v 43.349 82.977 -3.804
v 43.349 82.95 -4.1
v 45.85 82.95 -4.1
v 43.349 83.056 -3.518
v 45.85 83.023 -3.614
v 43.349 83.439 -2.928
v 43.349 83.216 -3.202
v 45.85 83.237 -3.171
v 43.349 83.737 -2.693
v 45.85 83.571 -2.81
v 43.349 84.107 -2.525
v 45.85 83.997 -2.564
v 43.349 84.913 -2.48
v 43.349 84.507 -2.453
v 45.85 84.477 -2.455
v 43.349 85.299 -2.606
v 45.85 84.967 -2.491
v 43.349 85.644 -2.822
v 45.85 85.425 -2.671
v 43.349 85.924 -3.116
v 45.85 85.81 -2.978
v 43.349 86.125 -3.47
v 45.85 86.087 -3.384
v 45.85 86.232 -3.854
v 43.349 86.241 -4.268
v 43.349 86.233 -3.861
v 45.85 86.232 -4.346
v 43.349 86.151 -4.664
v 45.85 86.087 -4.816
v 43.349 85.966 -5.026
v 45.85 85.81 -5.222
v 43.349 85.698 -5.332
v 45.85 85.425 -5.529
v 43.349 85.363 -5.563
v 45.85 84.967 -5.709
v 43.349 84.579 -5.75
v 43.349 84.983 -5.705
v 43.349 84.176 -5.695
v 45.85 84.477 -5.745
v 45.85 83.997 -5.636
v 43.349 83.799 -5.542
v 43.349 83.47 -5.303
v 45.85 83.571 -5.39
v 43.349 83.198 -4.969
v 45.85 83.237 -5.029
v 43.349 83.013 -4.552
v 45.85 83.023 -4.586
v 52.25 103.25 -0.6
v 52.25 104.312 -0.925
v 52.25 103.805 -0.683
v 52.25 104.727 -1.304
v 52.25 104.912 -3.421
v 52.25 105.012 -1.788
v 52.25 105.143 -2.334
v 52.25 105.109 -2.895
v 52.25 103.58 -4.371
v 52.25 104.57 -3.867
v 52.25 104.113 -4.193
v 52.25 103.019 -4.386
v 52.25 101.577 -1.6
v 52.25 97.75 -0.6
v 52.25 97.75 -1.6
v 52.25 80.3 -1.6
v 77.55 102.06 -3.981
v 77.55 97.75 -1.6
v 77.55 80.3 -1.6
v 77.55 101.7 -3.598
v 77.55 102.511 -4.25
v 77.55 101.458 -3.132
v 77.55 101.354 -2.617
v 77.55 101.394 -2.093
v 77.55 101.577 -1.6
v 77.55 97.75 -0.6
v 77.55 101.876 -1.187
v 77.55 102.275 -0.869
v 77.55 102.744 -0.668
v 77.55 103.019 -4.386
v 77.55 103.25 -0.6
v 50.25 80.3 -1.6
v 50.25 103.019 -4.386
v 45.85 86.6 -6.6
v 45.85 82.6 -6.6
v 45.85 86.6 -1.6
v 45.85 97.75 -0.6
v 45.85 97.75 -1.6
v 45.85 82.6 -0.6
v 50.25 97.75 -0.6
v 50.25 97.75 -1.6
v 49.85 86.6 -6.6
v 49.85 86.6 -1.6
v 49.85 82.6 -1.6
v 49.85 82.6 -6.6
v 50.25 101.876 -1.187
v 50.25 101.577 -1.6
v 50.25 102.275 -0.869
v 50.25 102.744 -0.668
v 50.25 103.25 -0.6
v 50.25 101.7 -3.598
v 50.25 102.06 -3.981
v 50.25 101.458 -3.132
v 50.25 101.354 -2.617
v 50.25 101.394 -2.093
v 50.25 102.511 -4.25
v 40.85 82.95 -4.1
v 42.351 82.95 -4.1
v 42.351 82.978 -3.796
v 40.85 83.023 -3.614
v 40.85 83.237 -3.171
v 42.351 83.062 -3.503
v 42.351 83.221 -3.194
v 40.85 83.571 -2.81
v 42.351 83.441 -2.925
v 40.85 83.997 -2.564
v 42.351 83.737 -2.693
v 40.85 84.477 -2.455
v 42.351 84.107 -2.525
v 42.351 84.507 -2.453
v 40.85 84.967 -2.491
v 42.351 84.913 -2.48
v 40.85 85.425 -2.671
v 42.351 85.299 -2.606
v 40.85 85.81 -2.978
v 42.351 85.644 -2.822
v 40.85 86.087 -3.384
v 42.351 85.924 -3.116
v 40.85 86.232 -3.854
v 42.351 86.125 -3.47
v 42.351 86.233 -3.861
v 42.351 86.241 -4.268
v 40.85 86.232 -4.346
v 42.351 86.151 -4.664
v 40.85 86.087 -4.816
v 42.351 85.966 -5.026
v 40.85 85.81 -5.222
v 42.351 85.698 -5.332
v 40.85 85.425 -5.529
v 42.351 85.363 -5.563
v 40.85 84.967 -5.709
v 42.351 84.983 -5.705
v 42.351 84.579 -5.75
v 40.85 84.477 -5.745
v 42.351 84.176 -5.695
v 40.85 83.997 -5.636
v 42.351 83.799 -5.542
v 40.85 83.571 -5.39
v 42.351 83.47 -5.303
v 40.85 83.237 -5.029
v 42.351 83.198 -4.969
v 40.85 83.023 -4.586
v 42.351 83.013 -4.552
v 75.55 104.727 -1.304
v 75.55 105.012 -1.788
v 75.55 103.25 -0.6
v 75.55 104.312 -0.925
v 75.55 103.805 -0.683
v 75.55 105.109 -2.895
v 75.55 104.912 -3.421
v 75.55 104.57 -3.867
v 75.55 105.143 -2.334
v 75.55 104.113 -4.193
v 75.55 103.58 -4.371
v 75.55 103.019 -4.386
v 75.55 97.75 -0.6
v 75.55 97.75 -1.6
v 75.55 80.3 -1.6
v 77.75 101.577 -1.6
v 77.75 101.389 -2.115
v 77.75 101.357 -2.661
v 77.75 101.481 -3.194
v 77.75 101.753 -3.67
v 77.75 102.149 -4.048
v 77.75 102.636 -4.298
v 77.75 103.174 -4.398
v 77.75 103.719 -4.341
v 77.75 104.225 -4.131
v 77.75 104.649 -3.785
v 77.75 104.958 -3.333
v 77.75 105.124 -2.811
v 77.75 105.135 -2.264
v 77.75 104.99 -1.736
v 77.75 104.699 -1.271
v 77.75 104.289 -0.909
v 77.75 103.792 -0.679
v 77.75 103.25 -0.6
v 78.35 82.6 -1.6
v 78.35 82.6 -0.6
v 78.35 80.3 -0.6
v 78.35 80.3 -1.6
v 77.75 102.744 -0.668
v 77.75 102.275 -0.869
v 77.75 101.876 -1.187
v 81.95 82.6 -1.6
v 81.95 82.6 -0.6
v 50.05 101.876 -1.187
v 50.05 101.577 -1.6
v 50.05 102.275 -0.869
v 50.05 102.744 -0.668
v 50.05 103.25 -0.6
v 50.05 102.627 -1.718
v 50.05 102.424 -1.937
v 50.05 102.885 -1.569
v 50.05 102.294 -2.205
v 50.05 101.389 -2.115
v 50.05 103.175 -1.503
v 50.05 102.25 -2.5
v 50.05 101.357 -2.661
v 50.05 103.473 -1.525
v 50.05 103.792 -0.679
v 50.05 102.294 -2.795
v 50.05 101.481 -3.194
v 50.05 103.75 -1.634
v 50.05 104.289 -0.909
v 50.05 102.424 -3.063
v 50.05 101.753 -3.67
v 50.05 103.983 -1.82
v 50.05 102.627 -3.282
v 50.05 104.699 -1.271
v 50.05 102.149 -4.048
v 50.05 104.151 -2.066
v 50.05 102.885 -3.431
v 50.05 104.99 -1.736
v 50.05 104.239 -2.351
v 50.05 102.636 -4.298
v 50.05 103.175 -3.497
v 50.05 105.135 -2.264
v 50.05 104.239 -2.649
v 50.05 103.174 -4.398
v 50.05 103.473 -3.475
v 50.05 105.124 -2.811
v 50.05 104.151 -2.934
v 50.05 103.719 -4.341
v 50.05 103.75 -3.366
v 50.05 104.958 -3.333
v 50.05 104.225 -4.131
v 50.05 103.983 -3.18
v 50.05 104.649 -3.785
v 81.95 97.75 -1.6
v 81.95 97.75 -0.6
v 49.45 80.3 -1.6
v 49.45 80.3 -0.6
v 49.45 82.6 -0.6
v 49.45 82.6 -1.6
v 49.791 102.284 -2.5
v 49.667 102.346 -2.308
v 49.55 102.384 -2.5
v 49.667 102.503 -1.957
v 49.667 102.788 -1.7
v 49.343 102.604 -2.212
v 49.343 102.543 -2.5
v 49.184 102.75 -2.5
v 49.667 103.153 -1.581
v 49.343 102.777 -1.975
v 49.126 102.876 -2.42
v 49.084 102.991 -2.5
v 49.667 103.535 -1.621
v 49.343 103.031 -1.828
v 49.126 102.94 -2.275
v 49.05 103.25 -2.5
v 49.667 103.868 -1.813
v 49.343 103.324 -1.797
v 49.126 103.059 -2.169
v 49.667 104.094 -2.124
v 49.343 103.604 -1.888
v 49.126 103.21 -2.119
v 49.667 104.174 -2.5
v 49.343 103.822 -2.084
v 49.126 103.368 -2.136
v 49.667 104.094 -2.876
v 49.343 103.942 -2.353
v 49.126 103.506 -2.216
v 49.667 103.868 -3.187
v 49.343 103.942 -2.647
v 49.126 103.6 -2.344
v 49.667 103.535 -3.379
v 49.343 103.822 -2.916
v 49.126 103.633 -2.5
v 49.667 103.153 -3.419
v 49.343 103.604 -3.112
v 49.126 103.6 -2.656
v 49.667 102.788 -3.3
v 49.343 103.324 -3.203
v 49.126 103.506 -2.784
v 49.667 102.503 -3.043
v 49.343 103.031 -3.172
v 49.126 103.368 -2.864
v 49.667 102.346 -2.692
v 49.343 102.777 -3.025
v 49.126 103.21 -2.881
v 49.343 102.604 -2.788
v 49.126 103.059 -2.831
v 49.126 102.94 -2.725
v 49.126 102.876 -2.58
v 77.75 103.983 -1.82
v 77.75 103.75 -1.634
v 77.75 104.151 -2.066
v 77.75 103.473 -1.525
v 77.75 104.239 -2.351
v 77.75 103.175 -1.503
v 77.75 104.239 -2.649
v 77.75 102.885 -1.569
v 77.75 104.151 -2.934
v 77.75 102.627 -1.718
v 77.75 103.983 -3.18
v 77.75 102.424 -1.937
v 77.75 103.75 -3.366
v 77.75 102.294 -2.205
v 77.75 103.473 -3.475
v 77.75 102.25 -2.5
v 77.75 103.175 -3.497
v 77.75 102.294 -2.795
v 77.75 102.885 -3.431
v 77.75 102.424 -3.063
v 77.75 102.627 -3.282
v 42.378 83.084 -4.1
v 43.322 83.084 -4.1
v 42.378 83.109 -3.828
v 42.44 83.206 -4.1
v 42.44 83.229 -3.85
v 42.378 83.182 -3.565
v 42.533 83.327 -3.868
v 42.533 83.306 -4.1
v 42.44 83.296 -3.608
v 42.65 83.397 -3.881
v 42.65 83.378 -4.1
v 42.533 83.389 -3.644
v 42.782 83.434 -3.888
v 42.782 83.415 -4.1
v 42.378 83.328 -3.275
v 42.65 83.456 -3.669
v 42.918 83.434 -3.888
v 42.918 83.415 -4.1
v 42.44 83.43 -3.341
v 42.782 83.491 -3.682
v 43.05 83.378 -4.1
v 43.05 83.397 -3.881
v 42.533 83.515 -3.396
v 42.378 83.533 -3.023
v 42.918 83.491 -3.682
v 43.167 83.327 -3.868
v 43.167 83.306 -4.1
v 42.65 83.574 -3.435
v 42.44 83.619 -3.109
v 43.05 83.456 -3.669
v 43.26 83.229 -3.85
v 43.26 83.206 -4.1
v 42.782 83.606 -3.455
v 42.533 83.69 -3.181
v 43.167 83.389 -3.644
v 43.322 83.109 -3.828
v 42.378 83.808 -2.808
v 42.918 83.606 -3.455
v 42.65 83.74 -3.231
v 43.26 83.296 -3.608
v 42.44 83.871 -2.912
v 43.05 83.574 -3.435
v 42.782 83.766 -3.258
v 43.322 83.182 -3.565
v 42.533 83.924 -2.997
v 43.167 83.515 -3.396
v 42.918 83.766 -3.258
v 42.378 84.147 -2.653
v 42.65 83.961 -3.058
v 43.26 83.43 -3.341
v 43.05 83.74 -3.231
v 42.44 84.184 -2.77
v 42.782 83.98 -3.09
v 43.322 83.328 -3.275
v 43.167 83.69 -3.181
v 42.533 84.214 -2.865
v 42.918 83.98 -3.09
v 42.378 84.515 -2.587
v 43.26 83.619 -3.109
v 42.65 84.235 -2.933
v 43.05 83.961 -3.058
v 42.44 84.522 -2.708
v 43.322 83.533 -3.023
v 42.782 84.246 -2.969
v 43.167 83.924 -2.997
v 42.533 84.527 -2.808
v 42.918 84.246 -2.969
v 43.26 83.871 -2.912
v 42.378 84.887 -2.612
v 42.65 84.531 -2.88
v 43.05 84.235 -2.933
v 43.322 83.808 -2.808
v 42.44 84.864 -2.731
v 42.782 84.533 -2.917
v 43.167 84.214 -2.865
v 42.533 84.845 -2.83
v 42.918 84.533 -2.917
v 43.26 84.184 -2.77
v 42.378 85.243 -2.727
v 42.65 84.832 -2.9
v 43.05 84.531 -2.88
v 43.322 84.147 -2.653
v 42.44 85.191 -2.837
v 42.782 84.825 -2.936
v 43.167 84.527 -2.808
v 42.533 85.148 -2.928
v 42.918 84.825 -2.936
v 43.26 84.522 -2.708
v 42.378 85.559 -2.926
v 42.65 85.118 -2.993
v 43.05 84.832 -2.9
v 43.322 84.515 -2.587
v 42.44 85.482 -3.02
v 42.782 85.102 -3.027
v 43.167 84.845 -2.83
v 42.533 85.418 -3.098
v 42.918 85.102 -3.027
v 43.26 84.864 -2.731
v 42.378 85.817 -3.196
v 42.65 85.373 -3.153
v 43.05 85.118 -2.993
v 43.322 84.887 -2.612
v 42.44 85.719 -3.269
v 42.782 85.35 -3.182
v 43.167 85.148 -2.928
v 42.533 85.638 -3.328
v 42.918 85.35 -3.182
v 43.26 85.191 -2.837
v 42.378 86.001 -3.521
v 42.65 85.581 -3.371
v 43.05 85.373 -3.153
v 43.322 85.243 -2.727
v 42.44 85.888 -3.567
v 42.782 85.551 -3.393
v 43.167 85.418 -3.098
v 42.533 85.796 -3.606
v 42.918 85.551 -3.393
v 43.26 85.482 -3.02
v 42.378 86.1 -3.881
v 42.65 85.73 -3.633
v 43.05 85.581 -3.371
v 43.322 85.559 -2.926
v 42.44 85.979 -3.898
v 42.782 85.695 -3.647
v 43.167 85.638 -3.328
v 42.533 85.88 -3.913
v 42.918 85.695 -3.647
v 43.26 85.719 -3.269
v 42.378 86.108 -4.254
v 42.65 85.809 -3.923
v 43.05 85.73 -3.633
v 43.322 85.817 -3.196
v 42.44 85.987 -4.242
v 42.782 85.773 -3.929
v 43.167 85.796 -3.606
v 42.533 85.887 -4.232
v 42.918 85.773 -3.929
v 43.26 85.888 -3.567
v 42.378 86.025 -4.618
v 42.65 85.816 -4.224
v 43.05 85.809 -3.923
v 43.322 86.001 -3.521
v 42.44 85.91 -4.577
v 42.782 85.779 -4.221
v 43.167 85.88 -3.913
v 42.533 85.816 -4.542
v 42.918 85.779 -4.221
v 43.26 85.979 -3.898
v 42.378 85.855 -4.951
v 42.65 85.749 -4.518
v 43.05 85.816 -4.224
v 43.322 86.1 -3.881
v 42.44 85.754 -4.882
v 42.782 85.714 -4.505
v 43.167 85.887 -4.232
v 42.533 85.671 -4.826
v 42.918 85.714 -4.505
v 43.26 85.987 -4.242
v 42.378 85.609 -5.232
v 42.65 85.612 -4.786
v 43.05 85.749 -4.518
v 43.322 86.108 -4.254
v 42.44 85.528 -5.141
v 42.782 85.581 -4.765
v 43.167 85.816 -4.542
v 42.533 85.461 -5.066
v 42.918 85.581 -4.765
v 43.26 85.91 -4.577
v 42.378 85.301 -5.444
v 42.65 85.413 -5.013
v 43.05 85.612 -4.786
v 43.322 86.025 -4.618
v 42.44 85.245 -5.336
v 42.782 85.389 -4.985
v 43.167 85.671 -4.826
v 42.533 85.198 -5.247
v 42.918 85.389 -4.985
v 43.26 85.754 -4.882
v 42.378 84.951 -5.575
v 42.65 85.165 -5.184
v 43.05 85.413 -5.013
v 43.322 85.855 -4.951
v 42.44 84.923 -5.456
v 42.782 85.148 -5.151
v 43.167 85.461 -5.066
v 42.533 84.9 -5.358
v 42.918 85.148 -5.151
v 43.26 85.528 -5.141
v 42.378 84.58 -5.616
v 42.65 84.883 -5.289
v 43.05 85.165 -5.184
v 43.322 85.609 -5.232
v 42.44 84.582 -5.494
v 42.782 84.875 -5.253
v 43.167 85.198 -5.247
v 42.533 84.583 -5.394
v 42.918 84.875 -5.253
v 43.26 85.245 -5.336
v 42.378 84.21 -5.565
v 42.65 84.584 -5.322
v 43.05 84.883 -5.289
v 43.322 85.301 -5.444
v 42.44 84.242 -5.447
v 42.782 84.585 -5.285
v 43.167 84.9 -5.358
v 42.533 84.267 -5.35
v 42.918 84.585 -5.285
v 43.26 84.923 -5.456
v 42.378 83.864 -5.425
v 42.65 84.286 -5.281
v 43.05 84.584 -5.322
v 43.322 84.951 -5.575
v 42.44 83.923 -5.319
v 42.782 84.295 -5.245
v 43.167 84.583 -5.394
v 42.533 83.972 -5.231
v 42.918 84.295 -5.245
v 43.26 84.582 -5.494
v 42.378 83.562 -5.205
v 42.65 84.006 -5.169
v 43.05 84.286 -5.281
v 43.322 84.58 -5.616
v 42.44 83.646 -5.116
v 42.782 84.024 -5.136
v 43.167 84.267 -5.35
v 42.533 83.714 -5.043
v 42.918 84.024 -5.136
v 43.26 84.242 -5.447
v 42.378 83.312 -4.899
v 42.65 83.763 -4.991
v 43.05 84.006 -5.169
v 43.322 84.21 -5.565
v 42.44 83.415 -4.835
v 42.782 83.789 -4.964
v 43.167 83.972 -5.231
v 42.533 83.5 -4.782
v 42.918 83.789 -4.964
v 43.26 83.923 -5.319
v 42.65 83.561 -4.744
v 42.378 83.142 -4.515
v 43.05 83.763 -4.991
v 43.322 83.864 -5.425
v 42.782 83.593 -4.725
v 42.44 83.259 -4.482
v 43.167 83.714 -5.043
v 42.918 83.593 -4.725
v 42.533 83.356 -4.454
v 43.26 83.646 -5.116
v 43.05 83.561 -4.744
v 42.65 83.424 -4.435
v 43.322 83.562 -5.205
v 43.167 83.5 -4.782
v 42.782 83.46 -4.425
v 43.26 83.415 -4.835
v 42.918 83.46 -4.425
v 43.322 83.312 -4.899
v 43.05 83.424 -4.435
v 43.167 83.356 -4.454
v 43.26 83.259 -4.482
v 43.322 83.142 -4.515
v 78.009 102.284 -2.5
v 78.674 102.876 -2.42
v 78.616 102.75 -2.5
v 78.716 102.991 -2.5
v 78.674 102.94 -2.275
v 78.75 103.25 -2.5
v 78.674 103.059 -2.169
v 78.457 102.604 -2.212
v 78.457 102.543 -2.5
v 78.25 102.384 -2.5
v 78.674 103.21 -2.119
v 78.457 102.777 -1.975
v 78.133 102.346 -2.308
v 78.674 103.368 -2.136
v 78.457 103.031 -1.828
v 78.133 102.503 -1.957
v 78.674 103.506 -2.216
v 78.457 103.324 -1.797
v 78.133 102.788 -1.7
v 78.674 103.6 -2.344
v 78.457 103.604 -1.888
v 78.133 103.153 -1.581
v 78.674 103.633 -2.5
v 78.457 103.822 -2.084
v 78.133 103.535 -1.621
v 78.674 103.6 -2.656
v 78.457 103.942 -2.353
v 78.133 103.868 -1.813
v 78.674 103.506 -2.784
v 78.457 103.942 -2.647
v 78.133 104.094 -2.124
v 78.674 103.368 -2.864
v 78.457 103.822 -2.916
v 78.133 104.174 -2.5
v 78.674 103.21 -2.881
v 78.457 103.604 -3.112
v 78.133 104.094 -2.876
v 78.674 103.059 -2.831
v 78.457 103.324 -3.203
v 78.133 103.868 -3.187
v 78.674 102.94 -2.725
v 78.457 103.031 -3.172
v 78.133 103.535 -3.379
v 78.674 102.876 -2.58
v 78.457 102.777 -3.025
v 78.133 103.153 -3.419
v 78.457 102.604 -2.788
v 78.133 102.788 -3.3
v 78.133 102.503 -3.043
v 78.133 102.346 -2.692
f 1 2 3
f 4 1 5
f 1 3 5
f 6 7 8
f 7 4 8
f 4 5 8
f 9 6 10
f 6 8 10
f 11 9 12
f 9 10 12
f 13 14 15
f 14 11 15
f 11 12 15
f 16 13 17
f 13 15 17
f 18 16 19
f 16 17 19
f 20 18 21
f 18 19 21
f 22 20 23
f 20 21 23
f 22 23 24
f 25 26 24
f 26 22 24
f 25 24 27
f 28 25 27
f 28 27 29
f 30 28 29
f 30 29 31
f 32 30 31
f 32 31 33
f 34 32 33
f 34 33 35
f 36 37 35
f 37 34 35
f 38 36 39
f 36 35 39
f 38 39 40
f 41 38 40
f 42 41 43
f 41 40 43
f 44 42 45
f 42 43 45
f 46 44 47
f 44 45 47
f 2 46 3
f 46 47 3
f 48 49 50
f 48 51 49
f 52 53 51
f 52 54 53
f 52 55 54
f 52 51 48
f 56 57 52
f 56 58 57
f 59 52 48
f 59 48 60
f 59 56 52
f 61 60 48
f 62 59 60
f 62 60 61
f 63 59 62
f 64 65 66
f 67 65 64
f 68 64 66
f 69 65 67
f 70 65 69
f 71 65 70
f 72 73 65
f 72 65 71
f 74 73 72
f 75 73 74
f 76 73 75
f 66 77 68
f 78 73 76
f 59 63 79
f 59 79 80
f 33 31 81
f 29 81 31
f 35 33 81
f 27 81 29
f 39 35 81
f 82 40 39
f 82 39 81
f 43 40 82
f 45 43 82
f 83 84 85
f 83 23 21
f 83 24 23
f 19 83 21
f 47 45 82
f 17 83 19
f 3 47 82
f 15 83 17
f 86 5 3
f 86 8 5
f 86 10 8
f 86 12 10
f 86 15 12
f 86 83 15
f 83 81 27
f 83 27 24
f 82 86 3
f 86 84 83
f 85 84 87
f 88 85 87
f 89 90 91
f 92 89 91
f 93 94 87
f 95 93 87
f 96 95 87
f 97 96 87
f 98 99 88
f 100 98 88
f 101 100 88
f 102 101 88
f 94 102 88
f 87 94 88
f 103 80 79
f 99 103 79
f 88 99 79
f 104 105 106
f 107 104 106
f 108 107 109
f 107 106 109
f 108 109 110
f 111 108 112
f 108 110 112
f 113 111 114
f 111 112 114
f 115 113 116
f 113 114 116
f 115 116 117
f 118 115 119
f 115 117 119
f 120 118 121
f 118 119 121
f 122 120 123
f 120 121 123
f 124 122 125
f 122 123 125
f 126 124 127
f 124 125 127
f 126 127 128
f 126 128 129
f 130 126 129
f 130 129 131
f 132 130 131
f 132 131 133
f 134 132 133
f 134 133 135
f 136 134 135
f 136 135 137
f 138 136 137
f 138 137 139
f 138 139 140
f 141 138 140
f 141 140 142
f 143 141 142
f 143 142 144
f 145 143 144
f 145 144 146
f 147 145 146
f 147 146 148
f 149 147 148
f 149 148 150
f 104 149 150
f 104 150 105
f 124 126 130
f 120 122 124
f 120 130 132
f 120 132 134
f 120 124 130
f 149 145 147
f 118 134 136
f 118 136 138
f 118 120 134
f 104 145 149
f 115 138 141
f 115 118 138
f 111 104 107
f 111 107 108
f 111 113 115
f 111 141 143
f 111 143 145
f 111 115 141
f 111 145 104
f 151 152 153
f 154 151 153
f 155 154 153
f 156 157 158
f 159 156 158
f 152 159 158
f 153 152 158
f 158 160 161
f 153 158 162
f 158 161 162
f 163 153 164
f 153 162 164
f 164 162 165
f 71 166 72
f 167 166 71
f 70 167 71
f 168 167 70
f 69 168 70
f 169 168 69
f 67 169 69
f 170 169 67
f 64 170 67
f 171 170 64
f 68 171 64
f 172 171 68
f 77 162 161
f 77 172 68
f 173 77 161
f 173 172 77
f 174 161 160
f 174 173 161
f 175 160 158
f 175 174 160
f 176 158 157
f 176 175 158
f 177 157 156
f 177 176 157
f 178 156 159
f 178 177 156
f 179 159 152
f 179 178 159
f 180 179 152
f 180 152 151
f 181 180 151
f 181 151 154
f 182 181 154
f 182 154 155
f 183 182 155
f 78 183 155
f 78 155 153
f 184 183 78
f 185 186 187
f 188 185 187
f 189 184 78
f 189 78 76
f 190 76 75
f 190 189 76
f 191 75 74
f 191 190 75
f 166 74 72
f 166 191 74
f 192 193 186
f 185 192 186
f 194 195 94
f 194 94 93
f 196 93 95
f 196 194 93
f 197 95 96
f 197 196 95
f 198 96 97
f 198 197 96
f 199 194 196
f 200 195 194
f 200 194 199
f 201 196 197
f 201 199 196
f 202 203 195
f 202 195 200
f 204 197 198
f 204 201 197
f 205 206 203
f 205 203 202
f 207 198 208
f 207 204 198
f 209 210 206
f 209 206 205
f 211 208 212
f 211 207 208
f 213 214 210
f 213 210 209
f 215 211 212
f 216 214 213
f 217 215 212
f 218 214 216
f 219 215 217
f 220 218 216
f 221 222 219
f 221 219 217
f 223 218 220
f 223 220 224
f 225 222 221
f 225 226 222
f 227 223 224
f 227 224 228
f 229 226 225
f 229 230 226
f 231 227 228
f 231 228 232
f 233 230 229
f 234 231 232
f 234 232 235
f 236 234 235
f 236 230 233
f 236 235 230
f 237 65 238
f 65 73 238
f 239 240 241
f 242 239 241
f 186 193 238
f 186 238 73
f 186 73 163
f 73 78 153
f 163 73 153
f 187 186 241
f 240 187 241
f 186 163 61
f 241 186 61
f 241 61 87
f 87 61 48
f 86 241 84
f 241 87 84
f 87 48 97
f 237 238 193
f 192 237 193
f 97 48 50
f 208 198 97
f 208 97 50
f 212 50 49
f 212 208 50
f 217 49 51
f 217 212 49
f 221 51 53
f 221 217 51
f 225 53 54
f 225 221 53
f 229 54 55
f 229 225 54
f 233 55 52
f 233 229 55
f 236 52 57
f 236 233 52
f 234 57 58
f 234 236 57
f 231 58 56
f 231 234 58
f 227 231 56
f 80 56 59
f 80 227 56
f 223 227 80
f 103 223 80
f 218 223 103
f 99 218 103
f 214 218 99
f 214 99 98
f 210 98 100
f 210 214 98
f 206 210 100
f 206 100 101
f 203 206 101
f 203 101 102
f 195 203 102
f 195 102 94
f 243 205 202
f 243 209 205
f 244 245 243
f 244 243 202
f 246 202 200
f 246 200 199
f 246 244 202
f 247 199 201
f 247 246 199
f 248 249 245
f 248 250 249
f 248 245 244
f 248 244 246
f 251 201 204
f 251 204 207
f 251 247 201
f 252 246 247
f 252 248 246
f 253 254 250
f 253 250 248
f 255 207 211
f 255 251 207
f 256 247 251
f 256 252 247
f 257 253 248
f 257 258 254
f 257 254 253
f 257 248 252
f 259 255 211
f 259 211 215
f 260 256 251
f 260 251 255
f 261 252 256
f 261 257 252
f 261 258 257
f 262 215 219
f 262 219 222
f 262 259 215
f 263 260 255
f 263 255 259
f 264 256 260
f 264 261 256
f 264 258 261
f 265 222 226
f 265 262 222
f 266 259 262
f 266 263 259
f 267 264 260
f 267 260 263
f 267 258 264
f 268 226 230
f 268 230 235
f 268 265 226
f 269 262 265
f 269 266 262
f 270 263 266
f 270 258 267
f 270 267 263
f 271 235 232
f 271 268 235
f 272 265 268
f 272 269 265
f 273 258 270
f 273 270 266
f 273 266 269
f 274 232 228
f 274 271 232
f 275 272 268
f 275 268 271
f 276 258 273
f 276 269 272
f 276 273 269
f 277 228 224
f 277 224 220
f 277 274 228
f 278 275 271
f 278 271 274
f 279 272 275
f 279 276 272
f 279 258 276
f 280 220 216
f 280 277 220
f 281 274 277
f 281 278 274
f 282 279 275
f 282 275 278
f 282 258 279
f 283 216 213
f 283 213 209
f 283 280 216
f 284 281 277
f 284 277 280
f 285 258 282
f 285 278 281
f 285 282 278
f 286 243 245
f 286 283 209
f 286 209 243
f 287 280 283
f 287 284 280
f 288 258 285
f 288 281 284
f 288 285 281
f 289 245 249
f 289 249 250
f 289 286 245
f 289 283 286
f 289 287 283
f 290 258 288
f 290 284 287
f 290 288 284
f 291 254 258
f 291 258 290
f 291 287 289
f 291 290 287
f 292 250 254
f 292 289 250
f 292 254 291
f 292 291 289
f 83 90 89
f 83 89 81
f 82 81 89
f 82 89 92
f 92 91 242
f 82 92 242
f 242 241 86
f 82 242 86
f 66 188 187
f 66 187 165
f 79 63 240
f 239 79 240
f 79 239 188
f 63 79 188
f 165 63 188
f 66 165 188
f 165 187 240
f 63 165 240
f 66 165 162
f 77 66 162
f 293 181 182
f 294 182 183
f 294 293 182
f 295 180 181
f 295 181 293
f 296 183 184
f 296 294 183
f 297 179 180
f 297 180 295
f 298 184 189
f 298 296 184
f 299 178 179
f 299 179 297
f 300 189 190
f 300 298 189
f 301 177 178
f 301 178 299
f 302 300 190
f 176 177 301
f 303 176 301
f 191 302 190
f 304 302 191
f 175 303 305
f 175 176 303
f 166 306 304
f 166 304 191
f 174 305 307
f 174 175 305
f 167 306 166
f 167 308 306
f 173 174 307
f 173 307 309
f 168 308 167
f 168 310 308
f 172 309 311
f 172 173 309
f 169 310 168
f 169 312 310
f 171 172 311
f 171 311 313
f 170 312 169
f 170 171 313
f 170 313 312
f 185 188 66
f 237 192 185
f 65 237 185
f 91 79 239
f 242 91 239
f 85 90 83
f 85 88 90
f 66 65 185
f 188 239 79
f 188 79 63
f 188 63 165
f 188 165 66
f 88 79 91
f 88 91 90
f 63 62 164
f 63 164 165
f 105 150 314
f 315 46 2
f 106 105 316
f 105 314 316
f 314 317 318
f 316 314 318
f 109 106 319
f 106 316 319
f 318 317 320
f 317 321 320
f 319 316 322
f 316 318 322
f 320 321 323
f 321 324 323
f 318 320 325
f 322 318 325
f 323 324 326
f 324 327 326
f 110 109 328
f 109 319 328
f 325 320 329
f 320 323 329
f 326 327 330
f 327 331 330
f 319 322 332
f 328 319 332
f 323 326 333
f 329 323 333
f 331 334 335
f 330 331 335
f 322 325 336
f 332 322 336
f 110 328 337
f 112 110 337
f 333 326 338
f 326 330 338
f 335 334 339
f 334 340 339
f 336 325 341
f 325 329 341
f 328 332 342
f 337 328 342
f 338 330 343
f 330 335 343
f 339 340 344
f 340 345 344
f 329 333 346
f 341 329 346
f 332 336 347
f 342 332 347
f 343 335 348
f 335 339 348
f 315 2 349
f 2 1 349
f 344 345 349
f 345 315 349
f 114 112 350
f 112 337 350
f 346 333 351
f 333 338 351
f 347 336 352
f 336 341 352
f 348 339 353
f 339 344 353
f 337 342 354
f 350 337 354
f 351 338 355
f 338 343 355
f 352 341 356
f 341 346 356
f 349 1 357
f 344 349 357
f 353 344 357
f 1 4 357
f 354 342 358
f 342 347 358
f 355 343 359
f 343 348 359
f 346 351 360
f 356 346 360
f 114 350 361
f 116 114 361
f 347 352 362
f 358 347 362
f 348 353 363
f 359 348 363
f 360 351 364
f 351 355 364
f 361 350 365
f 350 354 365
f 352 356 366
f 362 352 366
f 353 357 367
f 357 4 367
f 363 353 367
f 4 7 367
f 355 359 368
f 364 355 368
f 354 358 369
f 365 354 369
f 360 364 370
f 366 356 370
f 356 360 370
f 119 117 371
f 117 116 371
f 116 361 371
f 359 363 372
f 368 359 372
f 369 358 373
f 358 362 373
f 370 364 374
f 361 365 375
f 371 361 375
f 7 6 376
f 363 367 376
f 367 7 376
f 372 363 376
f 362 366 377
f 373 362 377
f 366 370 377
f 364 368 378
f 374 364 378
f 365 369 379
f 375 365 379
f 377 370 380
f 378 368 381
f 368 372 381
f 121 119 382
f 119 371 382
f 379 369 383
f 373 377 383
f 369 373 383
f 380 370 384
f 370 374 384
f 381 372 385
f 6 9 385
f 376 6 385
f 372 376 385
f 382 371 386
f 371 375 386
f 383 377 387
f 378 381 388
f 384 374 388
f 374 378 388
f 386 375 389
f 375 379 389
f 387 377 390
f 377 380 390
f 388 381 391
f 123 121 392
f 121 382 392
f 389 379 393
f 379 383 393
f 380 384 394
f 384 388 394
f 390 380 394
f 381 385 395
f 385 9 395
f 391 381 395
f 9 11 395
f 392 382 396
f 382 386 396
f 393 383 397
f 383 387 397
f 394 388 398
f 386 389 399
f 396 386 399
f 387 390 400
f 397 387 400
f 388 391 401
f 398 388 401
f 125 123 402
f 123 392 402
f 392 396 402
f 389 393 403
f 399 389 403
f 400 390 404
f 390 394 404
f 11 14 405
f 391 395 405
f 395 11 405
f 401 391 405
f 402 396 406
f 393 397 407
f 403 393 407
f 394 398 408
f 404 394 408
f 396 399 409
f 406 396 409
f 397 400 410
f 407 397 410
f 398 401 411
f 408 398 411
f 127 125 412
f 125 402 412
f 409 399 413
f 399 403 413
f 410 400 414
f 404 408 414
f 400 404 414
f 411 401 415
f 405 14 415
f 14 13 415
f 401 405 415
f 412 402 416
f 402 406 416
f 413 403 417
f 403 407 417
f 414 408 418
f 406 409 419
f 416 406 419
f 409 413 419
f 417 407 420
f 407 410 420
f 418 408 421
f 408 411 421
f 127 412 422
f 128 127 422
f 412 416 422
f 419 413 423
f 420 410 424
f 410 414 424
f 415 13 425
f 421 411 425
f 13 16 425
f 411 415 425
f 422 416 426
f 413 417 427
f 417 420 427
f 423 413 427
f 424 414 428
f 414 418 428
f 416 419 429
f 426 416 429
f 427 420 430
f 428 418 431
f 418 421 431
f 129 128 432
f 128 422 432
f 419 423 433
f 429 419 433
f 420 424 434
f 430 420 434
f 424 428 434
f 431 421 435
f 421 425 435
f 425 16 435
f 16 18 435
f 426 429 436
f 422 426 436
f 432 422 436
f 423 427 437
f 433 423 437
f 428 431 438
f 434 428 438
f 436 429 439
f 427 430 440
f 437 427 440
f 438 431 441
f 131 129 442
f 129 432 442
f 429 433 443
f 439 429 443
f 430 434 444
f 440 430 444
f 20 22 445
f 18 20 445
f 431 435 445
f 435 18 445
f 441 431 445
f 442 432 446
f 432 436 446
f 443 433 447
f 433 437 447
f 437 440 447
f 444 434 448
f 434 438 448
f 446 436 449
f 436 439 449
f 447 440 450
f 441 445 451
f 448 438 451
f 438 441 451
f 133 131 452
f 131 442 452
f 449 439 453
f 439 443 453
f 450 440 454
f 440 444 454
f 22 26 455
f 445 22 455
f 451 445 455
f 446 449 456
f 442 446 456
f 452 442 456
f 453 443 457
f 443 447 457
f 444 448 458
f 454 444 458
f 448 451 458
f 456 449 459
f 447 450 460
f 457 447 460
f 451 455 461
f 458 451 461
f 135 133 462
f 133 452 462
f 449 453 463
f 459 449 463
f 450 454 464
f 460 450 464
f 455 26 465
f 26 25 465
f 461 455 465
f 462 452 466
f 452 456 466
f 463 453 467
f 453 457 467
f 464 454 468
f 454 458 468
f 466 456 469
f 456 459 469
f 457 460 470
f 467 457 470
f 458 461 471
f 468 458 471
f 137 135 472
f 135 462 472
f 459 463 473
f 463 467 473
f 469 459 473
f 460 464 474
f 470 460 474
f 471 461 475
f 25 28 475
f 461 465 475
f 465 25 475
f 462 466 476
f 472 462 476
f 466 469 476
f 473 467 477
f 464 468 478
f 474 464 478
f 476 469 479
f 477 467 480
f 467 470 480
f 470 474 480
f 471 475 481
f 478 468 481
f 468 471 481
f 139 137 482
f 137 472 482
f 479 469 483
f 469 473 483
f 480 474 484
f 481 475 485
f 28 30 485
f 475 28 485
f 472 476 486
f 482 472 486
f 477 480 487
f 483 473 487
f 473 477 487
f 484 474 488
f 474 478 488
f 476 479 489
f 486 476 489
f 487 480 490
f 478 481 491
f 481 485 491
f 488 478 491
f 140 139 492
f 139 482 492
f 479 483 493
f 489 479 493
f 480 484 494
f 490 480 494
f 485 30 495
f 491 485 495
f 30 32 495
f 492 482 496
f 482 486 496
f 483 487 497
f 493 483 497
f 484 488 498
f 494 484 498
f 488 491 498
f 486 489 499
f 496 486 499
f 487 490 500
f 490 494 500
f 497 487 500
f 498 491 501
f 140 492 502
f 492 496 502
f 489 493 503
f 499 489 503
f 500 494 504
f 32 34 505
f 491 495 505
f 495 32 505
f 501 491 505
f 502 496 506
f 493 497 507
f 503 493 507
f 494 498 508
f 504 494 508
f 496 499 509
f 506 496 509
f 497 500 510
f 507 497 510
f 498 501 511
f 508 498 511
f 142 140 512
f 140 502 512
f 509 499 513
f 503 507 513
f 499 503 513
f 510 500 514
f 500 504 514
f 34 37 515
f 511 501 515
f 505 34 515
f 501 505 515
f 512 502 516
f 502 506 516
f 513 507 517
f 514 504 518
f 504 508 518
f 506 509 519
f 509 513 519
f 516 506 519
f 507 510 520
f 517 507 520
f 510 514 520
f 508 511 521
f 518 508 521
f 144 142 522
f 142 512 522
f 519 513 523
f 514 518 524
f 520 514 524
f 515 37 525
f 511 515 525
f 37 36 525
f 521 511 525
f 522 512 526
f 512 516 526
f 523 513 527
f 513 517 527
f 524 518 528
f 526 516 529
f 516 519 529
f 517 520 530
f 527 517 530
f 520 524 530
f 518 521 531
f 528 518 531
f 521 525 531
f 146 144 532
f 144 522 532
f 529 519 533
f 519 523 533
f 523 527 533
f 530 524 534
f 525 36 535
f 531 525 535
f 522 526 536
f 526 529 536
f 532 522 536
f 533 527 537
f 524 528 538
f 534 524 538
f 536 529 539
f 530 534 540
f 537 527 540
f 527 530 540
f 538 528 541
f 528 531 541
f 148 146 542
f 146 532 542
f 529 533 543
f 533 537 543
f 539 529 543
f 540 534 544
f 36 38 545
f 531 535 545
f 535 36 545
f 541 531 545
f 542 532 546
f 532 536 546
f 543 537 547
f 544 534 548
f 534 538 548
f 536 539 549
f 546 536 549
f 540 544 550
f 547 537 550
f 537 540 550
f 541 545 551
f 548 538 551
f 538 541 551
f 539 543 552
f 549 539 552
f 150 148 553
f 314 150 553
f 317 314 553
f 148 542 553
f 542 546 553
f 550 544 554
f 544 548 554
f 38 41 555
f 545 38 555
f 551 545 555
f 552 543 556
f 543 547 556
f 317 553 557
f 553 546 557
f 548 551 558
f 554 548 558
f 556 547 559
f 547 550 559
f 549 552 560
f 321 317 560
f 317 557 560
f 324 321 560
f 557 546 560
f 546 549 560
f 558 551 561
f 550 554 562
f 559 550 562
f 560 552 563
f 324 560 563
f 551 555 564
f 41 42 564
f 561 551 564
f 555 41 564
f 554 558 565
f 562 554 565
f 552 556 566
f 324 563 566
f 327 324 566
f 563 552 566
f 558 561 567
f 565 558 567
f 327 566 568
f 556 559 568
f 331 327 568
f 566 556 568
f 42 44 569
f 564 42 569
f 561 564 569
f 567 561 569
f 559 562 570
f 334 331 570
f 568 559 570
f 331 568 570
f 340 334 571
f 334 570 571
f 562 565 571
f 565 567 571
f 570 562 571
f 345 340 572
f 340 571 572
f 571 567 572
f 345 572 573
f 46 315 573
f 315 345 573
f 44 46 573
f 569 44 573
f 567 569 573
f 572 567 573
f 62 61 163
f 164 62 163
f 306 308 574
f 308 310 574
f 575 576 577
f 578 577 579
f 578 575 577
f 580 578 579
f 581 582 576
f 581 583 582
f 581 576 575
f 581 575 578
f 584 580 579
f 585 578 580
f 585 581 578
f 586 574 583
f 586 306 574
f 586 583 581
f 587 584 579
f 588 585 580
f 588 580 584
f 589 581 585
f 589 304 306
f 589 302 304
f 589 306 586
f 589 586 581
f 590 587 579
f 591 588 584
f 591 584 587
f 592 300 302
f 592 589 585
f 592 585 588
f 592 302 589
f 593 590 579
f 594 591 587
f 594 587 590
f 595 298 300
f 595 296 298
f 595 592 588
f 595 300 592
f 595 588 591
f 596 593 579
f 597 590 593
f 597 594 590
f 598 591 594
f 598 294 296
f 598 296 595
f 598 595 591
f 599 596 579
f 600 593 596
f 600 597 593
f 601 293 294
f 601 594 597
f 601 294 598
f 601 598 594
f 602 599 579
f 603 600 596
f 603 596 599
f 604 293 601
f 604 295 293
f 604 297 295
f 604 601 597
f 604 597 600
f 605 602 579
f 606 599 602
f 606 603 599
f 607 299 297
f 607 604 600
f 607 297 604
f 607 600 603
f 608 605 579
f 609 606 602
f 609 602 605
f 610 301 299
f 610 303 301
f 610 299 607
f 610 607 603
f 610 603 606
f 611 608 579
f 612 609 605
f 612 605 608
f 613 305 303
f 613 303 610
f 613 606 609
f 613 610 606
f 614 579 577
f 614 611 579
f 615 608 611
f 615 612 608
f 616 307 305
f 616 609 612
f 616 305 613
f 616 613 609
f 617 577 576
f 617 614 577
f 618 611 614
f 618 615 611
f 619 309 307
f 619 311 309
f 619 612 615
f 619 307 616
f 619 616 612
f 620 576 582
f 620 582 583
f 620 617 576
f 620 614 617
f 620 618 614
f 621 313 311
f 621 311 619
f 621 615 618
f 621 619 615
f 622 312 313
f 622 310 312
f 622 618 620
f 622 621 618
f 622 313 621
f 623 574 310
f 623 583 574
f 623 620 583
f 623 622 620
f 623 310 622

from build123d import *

# Parameters (mm, degrees)
PAD038_DEPTH             = 1
PAD039_DEPTH             = 2.2
POCKET022_DEPTH          = 0.2
PAD040_DEPTH             = 2.2
POCKET023_DEPTH          = 0.2
SKETCH063_W              = 4
SKETCH063_H              = 4
PAD041_DEPTH             = 5
SKETCH064_R              = 1.65
PAD042_DEPTH             = 5
SKETCH065_R              = 0.5
PAD084_DEPTH             = 2
PAD085_DEPTH             = 2
CLONE003_PLACEMENT_ANGLE = 180


with BuildPart() as part:
    # Sketch058 (on DatumPlane) → Pad038 (new body)
    with BuildSketch(Plane(origin=(0, 0, -0.6), x_dir=(1, 0, 0), z_dir=(0, 0, -1))):
        Polygon((45.85, -61.65), (45.85, -76.8), (49.45, -76.8), (49.45, -79.1), (78.35, -79.1), (78.35, -76.8), (81.95, -76.8), (81.95, -61.65), (77.55, -61.65), (77.55, -58.65), (77.75, -58.65), (77.75, -56.15), (75.55, -56.15), (75.55, -61.65), (52.25, -61.65), (52.25, -56.15), (50.05, -56.15), (50.05, -58.65), (50.25, -58.65), (50.25, -61.65), align=None)
    extrude(amount=PAD038_DEPTH)

    # Sketch059 (on Face17 of Pad038) → Pad039 (join)
    with BuildSketch(Plane(origin=(50.05, 0, -0.6), x_dir=(0, 1, 0), z_dir=(-1, 0, 0))):
        with BuildLine():
            ThreePointArc((57.82332, 1), (55.175321, 3.530951), (56.15, 0))
            Line((56.15, 1), (56.15, 0))
            Line((57.82332, 1), (56.15, 1))
        make_face()
    extrude(amount=-PAD039_DEPTH)

    # Sketch060 (on Face22 of Pad039) → Pocket022 (cut)
    with BuildSketch(Plane(origin=(50.05, 0, -0.6), x_dir=(0, 1, 0), z_dir=(-1, 0, 0))):
        with BuildLine():
            ThreePointArc((56.15, 0), (57.124679, 0.269049), (57.82332, 1))
            Line((57.82332, 1), (58.65, 1))
            Line((58.65, 1), (58.65, 0))
            Line((58.65, 0), (56.15, 0))
        make_face()
    extrude(amount=-POCKET022_DEPTH, mode=Mode.SUBTRACT)

    # Sketch061 (on Face14 of Pocket022) → Pad040 (join)
    with BuildSketch(Plane(origin=(77.75, 0, -0.6), x_dir=(0, -1, 0), z_dir=(1, 0, 0))):
        with BuildLine():
            ThreePointArc((-56.15, 0), (-55.175321, 3.530951), (-57.82332, 1))
            Line((-57.82332, 1), (-56.15, 1))
            Line((-56.15, 1), (-56.15, 0))
        make_face()
    extrude(amount=-PAD040_DEPTH)

    # Sketch062 (on Face20 of Pad040) → Pocket023 (cut)
    with BuildSketch(Plane(origin=(77.75, 0, -0.6), x_dir=(0, -1, 0), z_dir=(1, 0, 0))):
        with BuildLine():
            ThreePointArc((-57.82332, 1), (-57.124679, 0.269049), (-56.15, 0))
            Line((-58.65, 0), (-56.15, 0))
            Line((-58.65, 1), (-58.65, 0))
            Line((-57.82332, 1), (-58.65, 1))
        make_face()
    extrude(amount=-POCKET023_DEPTH, mode=Mode.SUBTRACT)

    # Sphere004 → Sphere004 (revolve)
    with BuildSketch(Plane(origin=(50.05, 56.15, -2.5), x_dir=(0, 1, 0), z_dir=(0, 0, -1))):
        with BuildLine():
            ThreePointArc((0, -1), (1, 0), (0, 1))
            Line((0, 1), (0, -1))
        make_face()
    revolve(axis=Axis((50.05, 56.15, -2.5), (1, 0, 0)))

    # Sphere005 → Sphere005 (revolve)
    with BuildSketch(Plane(origin=(77.75, 56.15, -2.5), x_dir=(0, 1, 0), z_dir=(0, 0, -1))):
        with BuildLine():
            ThreePointArc((0, -1), (1, 0), (0, 1))
            Line((0, 1), (0, -1))
        make_face()
    revolve(axis=Axis((77.75, 56.15, -2.5), (1, 0, 0)))

    # Sketch063 (on Face5 of Sphere005) → Pad041 (join)
    with BuildSketch(Plane(origin=(77.75, 56.15, -1.6), x_dir=(0, 1, 0), z_dir=(0, 0, -1))):
        with Locations((18.65, 2.2)):
            Rectangle(SKETCH063_W, SKETCH063_H)
    extrude(amount=PAD041_DEPTH)

    # Sketch064 (on Face25 of Pad041) → Pad042 (join)
    with BuildSketch(Plane(origin=(81.95, 56.15, -2.5), x_dir=(0, 1, 0), z_dir=(1, 0, 0))):
        with Locations((18.65, -1.599996)):
            Circle(SKETCH064_R)
    extrude(amount=PAD042_DEPTH)

    # Sketch065 (on DatumPlane) → Groove002 (revolve, cut)
    with BuildSketch(Plane(origin=(84.45, 74.8, -4.1), x_dir=(0, 1, 0), z_dir=(0, 0, -1))):
        with Locations((1.680544, 0.5)):
            Circle(SKETCH065_R)
    revolve(axis=Axis((84.45, 74.8, -4.1), (1, 0, 0)), mode=Mode.SUBTRACT)

    # Sketch107 (on Face17 of Groove002) → Pad084 (join)
    with BuildSketch(Plane(origin=(52.25, 56.15, -2.5), x_dir=(0, 1, 0), z_dir=(1, 0, 0))):
        Polygon((22.95, 0.900005), (0.231255, -1.885874), (1.67332, 0.9), align=None)
    extrude(amount=-PAD084_DEPTH)

    # Sketch108 (on Face14 of Pad084) → Pad085 (join)
    with BuildSketch(Plane(origin=(75.55, 56.15, -2.5), x_dir=(0, 1, 0), z_dir=(-1, 0, 0))):
        Polygon((1.67332, -0.9), (22.95, -0.900005), (0.231255, 1.885874), align=None)
    extrude(amount=-PAD085_DEPTH)


with BuildPart() as part_1:
    # Clone003 placement: moved
    add(part.part.moved(Location((91.8, 159.4, 0))).rotate(Axis((91.8, 159.4, 0), (0, 0, -1)), CLONE003_PLACEMENT_ANGLE))


with BuildPart() as part_2:
    # Body021 placement: moved
    add(part_1.part.moved(Location((36, 0, 0))))


solid = part_2.part
